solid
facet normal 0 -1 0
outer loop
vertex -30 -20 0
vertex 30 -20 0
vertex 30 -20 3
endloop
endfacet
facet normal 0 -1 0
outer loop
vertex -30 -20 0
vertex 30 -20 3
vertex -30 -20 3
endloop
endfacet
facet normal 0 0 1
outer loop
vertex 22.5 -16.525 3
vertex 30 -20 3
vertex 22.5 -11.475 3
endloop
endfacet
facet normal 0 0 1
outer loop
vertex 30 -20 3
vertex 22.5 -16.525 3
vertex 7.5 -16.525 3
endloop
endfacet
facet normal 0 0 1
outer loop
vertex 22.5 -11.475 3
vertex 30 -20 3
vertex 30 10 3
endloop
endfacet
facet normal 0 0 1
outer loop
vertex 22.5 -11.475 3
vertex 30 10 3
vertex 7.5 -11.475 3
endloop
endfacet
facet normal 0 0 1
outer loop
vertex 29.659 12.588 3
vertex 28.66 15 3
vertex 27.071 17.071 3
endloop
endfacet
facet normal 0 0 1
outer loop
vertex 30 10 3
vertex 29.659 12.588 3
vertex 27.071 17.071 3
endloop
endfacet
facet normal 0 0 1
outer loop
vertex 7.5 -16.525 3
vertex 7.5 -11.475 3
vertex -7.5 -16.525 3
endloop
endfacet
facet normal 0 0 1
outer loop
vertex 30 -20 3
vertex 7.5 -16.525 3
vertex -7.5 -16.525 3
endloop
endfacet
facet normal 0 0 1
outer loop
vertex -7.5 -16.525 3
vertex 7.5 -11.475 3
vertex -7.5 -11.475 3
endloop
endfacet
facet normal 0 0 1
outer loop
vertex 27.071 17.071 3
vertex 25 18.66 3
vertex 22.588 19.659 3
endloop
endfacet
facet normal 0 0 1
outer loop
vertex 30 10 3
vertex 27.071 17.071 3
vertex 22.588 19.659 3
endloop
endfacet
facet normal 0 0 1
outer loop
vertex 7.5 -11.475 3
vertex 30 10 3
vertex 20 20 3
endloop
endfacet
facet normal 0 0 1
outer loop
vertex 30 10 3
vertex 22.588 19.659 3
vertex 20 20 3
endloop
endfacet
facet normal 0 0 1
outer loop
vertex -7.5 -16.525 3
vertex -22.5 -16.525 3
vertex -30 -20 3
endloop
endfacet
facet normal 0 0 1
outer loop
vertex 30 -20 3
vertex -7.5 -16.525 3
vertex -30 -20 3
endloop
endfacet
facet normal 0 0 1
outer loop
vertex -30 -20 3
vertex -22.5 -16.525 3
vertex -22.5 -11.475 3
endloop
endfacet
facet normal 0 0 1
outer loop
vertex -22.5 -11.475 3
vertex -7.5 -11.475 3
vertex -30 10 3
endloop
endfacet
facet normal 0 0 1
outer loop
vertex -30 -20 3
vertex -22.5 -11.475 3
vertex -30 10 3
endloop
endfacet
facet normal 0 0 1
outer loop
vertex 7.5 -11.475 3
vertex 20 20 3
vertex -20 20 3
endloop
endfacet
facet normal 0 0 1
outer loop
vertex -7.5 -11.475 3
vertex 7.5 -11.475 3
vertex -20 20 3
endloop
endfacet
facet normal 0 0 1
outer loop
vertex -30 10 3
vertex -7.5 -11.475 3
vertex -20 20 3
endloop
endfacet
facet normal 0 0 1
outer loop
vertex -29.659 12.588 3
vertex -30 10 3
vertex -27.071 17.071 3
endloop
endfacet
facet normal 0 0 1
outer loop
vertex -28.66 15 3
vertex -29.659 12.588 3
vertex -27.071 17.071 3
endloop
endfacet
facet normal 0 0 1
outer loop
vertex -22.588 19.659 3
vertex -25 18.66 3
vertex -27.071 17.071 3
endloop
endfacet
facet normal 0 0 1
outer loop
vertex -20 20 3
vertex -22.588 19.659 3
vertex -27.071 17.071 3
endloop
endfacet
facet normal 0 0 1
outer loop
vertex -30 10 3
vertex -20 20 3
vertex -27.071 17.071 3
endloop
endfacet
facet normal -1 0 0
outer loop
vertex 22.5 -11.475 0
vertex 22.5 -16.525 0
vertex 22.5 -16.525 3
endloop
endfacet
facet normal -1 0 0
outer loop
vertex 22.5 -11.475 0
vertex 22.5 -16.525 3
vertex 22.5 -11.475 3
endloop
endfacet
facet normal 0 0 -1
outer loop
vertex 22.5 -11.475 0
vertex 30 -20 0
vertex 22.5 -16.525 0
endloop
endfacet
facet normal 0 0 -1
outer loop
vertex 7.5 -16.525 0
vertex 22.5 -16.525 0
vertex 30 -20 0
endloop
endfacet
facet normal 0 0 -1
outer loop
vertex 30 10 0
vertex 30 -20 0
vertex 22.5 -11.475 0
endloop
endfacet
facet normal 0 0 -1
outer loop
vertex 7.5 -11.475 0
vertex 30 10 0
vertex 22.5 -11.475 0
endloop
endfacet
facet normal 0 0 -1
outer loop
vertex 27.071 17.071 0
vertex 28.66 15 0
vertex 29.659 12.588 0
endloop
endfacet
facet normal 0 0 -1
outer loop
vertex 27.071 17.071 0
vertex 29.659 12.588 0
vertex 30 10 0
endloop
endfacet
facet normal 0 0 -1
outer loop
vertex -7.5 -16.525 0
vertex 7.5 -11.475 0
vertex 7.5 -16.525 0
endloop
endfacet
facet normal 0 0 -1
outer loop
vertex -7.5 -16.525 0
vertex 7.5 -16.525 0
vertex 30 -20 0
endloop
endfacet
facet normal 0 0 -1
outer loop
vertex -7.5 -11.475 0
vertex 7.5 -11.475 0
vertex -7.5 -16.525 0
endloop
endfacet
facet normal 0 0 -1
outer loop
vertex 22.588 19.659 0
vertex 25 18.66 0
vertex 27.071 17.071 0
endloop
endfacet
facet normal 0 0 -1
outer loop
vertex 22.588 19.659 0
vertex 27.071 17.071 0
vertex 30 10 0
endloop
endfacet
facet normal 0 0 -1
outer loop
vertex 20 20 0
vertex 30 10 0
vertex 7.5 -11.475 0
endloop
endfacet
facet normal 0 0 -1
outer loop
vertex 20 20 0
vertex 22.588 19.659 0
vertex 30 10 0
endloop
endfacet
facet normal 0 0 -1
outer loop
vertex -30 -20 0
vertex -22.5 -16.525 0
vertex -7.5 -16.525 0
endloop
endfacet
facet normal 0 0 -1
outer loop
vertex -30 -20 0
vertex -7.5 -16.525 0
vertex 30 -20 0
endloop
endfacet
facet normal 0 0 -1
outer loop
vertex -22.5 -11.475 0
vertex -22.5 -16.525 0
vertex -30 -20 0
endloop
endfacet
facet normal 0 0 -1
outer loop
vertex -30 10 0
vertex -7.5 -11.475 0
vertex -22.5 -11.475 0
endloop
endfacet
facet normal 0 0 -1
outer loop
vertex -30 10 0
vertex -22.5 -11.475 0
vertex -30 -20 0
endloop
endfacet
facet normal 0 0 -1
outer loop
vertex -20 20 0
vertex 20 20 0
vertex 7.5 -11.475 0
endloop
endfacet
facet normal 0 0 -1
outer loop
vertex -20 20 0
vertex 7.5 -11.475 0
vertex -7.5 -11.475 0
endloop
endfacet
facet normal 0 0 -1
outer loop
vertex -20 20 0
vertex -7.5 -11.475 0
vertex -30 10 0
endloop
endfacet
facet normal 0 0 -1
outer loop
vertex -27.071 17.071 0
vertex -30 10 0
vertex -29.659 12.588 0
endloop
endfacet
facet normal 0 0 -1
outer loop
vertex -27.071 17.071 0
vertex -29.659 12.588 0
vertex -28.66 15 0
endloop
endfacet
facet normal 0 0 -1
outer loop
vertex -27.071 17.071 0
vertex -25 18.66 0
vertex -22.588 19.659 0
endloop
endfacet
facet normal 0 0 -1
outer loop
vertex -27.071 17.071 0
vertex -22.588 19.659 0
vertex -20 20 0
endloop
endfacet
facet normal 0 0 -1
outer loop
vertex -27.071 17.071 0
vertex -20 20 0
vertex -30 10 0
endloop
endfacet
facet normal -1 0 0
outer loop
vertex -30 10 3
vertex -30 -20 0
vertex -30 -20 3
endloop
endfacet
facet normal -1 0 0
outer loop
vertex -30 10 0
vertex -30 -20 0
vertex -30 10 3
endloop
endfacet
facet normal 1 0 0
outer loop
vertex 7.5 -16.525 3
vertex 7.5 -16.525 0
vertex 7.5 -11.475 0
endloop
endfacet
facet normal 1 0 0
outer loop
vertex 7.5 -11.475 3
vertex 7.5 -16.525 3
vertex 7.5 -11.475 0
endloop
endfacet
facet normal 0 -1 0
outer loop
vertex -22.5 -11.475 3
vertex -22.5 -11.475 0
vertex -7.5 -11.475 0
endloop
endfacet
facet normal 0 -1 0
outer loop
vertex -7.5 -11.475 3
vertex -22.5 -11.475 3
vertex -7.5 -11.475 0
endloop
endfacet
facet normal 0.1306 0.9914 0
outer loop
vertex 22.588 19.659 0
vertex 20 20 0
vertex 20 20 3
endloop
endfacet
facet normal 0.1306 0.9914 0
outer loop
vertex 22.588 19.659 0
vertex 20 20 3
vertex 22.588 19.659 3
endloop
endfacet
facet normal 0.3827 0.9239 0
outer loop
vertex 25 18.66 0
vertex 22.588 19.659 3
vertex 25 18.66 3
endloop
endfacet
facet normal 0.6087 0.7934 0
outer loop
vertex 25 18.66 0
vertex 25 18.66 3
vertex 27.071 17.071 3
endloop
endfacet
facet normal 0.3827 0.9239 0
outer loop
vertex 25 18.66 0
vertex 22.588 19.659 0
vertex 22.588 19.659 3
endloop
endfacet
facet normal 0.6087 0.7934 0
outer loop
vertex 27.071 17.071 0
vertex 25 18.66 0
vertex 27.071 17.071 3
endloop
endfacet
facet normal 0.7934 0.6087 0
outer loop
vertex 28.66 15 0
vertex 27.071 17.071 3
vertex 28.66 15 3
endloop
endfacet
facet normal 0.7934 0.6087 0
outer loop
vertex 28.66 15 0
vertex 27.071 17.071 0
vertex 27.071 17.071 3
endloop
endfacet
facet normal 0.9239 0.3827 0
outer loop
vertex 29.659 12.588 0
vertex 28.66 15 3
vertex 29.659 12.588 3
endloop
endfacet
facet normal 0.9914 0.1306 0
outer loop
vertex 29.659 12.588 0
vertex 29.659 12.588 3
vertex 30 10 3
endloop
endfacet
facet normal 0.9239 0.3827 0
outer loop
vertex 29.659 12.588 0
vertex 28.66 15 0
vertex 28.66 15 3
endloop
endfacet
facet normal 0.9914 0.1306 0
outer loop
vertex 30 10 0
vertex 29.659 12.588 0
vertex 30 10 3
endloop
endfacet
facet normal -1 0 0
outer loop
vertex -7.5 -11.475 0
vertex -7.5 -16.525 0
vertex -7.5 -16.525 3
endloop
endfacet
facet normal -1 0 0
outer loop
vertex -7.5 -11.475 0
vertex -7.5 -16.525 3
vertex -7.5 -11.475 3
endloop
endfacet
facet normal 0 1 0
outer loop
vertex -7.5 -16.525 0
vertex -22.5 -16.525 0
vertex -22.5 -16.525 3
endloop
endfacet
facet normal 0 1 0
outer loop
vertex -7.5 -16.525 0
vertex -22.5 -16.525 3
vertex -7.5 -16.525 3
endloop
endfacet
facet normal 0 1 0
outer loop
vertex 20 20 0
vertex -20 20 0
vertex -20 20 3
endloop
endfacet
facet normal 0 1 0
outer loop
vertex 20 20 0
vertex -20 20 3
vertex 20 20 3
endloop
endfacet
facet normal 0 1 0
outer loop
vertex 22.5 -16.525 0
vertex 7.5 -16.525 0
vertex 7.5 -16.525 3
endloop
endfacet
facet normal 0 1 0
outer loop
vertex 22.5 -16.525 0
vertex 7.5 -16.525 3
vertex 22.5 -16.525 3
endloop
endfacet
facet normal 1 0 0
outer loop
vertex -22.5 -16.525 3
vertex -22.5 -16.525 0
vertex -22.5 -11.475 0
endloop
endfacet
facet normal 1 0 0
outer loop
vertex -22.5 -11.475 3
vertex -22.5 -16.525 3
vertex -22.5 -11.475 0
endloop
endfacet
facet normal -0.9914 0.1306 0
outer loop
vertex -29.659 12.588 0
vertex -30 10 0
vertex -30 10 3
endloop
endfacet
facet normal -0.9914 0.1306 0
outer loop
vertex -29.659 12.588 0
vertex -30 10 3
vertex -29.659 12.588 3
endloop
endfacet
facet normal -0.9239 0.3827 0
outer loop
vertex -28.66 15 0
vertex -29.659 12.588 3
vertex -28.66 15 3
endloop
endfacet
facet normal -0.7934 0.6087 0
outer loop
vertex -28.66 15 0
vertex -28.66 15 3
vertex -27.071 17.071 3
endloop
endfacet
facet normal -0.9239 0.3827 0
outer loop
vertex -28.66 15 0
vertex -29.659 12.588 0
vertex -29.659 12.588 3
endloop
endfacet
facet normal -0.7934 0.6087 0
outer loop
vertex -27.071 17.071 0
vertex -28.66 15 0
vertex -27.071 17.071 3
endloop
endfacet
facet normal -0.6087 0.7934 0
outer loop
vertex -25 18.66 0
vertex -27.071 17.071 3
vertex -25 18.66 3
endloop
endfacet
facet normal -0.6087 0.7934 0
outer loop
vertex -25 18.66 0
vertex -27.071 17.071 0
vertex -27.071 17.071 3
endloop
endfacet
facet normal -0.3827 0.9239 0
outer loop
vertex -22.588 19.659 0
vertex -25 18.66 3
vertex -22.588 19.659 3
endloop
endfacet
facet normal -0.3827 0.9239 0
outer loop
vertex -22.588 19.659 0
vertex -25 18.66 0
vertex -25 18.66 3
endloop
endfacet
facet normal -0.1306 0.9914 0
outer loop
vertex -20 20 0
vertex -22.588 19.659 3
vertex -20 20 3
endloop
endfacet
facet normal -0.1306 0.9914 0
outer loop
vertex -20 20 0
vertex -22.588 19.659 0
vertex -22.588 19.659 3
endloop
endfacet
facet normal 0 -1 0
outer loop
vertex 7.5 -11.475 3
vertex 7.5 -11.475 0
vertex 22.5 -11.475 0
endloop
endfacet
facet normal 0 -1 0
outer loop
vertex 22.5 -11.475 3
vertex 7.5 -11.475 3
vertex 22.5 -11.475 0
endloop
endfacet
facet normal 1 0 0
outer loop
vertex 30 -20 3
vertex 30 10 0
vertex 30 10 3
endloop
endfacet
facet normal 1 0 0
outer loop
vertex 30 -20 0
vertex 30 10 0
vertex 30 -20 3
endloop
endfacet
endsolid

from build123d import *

# Parameters (mm, degrees)
ESQUISSE1_W        = 15
ESQUISSE1_H        = 5.05
BOSS_EXTRU_1_DEPTH = 3


with BuildPart() as part:
    # Esquisse1 → Boss.-Extru.1 (new body)
    with BuildSketch(Plane.XY):
        with BuildLine():
            Line((-20, 20), (20, 20))
            ThreePointArc((20, 20), (27.071067812, 17.071067812), (30, 10))
            Line((30, 10), (30, -20))
            Line((30, -20), (-30, -20))
            Line((-30, -20), (-30, 10))
            ThreePointArc((-30, 10), (-27.071067812, 17.071067812), (-20, 20))
        make_face()
        with Locations((15, -14)):
            Rectangle(ESQUISSE1_W, ESQUISSE1_H, mode=Mode.SUBTRACT)
        with Locations((-15, -14)):
            Rectangle(ESQUISSE1_W, ESQUISSE1_H, mode=Mode.SUBTRACT)
    extrude(amount=BOSS_EXTRU_1_DEPTH)


solid = part.part
